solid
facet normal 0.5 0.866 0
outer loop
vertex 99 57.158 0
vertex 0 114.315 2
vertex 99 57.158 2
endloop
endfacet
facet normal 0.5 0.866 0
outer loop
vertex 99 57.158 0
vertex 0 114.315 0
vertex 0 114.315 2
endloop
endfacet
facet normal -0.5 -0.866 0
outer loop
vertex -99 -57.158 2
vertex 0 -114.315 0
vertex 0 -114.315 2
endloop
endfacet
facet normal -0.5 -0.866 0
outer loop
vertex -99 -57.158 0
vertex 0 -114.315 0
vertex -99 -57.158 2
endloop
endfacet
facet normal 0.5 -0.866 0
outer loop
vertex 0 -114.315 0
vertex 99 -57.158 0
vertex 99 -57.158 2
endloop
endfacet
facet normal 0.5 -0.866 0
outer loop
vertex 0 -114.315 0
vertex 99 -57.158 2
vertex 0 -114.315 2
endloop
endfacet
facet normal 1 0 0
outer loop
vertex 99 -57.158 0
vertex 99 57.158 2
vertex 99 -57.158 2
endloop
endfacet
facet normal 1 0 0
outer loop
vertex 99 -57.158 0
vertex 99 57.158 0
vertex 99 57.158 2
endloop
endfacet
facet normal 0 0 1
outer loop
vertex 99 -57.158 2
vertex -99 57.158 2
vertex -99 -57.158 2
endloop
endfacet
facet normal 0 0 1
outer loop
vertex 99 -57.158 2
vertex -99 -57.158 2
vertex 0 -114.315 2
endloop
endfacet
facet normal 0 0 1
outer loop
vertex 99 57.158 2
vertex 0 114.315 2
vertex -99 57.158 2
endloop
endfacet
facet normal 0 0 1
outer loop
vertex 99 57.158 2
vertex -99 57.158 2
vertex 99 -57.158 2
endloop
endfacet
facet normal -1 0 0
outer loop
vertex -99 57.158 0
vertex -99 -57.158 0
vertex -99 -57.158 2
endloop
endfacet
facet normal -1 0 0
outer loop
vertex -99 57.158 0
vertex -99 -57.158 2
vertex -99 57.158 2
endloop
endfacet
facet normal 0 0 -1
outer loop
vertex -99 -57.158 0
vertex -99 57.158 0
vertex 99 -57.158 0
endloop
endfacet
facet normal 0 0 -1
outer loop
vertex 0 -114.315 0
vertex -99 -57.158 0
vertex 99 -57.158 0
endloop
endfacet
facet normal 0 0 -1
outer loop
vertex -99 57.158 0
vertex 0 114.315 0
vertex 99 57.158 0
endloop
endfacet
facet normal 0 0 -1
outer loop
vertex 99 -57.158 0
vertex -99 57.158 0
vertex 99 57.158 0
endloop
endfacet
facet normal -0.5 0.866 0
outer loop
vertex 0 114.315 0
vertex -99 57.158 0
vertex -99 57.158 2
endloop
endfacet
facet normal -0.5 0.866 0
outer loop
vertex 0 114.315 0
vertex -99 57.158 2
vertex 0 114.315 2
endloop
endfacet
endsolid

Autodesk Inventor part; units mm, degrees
ref_plane "YZ Plane" through (0, 0, 0) normal (1, 0, 0) x (0, 1, 0)
ref_plane "XZ Plane" through (0, 0, 0) normal (0, 1, 0) x (-1, 0, 0)
ref_plane "XY Plane" through (0, 0, 0) normal (0, 0, 1) x (1, 0, 0)
sketch "Sketch8" plane through (0, 0, 0) normal (0, 0, 1) x (1, 0, 0)
  circle A0 centre (0, 0) radius 82
  line L0 (99, -57.1577) -> (0, -114.3154)
  line L1 (0, -114.3154) -> (-99, -57.1577)
  line L2 (-99, -57.1577) -> (-99, 57.1577)
  line L3 (-99, 57.1577) -> (0, 114.3154)
  line L4 (0, 114.3154) -> (99, 57.1577)
  line L5 (99, 57.1577) -> (99, -57.1577)
  dimension "d44" = 164
  dimension "d47" = 198
extrude "Plate3" add sketch "Sketch8" along normal blind 2 contours A0 | L0 L1 L2 L3 L4 L5
equation "\"d48\" = Thickness"
equation "\"BendReliefWidth\" = Thickness"
equation "\"BendReliefDepth\" = 0.5 * Thickness"
equation "\"CornerReliefSize\" = 4 * Thickness"
equation "\"MinimumRemnant\" = 2 * Thickness"
equation "\"TransitionRadius\" = BendRadius"
equation "\"JacobiRadiusSize\" = BendRadius"
equation "\"GapSize\" = Thickness"
equation "\"Octaeder_side\" = d41"
equation "\"Octaeder_flange_lenth\" = d42"
equation "\"Thickness\" = 2"
equation "\"BendRadius\" = 6"
equation "\"d41\" = 55.918831"
equation "\"d42\" = 72.5"
properties part number "DSB 126 hex cup" material "Stainless Steel"
